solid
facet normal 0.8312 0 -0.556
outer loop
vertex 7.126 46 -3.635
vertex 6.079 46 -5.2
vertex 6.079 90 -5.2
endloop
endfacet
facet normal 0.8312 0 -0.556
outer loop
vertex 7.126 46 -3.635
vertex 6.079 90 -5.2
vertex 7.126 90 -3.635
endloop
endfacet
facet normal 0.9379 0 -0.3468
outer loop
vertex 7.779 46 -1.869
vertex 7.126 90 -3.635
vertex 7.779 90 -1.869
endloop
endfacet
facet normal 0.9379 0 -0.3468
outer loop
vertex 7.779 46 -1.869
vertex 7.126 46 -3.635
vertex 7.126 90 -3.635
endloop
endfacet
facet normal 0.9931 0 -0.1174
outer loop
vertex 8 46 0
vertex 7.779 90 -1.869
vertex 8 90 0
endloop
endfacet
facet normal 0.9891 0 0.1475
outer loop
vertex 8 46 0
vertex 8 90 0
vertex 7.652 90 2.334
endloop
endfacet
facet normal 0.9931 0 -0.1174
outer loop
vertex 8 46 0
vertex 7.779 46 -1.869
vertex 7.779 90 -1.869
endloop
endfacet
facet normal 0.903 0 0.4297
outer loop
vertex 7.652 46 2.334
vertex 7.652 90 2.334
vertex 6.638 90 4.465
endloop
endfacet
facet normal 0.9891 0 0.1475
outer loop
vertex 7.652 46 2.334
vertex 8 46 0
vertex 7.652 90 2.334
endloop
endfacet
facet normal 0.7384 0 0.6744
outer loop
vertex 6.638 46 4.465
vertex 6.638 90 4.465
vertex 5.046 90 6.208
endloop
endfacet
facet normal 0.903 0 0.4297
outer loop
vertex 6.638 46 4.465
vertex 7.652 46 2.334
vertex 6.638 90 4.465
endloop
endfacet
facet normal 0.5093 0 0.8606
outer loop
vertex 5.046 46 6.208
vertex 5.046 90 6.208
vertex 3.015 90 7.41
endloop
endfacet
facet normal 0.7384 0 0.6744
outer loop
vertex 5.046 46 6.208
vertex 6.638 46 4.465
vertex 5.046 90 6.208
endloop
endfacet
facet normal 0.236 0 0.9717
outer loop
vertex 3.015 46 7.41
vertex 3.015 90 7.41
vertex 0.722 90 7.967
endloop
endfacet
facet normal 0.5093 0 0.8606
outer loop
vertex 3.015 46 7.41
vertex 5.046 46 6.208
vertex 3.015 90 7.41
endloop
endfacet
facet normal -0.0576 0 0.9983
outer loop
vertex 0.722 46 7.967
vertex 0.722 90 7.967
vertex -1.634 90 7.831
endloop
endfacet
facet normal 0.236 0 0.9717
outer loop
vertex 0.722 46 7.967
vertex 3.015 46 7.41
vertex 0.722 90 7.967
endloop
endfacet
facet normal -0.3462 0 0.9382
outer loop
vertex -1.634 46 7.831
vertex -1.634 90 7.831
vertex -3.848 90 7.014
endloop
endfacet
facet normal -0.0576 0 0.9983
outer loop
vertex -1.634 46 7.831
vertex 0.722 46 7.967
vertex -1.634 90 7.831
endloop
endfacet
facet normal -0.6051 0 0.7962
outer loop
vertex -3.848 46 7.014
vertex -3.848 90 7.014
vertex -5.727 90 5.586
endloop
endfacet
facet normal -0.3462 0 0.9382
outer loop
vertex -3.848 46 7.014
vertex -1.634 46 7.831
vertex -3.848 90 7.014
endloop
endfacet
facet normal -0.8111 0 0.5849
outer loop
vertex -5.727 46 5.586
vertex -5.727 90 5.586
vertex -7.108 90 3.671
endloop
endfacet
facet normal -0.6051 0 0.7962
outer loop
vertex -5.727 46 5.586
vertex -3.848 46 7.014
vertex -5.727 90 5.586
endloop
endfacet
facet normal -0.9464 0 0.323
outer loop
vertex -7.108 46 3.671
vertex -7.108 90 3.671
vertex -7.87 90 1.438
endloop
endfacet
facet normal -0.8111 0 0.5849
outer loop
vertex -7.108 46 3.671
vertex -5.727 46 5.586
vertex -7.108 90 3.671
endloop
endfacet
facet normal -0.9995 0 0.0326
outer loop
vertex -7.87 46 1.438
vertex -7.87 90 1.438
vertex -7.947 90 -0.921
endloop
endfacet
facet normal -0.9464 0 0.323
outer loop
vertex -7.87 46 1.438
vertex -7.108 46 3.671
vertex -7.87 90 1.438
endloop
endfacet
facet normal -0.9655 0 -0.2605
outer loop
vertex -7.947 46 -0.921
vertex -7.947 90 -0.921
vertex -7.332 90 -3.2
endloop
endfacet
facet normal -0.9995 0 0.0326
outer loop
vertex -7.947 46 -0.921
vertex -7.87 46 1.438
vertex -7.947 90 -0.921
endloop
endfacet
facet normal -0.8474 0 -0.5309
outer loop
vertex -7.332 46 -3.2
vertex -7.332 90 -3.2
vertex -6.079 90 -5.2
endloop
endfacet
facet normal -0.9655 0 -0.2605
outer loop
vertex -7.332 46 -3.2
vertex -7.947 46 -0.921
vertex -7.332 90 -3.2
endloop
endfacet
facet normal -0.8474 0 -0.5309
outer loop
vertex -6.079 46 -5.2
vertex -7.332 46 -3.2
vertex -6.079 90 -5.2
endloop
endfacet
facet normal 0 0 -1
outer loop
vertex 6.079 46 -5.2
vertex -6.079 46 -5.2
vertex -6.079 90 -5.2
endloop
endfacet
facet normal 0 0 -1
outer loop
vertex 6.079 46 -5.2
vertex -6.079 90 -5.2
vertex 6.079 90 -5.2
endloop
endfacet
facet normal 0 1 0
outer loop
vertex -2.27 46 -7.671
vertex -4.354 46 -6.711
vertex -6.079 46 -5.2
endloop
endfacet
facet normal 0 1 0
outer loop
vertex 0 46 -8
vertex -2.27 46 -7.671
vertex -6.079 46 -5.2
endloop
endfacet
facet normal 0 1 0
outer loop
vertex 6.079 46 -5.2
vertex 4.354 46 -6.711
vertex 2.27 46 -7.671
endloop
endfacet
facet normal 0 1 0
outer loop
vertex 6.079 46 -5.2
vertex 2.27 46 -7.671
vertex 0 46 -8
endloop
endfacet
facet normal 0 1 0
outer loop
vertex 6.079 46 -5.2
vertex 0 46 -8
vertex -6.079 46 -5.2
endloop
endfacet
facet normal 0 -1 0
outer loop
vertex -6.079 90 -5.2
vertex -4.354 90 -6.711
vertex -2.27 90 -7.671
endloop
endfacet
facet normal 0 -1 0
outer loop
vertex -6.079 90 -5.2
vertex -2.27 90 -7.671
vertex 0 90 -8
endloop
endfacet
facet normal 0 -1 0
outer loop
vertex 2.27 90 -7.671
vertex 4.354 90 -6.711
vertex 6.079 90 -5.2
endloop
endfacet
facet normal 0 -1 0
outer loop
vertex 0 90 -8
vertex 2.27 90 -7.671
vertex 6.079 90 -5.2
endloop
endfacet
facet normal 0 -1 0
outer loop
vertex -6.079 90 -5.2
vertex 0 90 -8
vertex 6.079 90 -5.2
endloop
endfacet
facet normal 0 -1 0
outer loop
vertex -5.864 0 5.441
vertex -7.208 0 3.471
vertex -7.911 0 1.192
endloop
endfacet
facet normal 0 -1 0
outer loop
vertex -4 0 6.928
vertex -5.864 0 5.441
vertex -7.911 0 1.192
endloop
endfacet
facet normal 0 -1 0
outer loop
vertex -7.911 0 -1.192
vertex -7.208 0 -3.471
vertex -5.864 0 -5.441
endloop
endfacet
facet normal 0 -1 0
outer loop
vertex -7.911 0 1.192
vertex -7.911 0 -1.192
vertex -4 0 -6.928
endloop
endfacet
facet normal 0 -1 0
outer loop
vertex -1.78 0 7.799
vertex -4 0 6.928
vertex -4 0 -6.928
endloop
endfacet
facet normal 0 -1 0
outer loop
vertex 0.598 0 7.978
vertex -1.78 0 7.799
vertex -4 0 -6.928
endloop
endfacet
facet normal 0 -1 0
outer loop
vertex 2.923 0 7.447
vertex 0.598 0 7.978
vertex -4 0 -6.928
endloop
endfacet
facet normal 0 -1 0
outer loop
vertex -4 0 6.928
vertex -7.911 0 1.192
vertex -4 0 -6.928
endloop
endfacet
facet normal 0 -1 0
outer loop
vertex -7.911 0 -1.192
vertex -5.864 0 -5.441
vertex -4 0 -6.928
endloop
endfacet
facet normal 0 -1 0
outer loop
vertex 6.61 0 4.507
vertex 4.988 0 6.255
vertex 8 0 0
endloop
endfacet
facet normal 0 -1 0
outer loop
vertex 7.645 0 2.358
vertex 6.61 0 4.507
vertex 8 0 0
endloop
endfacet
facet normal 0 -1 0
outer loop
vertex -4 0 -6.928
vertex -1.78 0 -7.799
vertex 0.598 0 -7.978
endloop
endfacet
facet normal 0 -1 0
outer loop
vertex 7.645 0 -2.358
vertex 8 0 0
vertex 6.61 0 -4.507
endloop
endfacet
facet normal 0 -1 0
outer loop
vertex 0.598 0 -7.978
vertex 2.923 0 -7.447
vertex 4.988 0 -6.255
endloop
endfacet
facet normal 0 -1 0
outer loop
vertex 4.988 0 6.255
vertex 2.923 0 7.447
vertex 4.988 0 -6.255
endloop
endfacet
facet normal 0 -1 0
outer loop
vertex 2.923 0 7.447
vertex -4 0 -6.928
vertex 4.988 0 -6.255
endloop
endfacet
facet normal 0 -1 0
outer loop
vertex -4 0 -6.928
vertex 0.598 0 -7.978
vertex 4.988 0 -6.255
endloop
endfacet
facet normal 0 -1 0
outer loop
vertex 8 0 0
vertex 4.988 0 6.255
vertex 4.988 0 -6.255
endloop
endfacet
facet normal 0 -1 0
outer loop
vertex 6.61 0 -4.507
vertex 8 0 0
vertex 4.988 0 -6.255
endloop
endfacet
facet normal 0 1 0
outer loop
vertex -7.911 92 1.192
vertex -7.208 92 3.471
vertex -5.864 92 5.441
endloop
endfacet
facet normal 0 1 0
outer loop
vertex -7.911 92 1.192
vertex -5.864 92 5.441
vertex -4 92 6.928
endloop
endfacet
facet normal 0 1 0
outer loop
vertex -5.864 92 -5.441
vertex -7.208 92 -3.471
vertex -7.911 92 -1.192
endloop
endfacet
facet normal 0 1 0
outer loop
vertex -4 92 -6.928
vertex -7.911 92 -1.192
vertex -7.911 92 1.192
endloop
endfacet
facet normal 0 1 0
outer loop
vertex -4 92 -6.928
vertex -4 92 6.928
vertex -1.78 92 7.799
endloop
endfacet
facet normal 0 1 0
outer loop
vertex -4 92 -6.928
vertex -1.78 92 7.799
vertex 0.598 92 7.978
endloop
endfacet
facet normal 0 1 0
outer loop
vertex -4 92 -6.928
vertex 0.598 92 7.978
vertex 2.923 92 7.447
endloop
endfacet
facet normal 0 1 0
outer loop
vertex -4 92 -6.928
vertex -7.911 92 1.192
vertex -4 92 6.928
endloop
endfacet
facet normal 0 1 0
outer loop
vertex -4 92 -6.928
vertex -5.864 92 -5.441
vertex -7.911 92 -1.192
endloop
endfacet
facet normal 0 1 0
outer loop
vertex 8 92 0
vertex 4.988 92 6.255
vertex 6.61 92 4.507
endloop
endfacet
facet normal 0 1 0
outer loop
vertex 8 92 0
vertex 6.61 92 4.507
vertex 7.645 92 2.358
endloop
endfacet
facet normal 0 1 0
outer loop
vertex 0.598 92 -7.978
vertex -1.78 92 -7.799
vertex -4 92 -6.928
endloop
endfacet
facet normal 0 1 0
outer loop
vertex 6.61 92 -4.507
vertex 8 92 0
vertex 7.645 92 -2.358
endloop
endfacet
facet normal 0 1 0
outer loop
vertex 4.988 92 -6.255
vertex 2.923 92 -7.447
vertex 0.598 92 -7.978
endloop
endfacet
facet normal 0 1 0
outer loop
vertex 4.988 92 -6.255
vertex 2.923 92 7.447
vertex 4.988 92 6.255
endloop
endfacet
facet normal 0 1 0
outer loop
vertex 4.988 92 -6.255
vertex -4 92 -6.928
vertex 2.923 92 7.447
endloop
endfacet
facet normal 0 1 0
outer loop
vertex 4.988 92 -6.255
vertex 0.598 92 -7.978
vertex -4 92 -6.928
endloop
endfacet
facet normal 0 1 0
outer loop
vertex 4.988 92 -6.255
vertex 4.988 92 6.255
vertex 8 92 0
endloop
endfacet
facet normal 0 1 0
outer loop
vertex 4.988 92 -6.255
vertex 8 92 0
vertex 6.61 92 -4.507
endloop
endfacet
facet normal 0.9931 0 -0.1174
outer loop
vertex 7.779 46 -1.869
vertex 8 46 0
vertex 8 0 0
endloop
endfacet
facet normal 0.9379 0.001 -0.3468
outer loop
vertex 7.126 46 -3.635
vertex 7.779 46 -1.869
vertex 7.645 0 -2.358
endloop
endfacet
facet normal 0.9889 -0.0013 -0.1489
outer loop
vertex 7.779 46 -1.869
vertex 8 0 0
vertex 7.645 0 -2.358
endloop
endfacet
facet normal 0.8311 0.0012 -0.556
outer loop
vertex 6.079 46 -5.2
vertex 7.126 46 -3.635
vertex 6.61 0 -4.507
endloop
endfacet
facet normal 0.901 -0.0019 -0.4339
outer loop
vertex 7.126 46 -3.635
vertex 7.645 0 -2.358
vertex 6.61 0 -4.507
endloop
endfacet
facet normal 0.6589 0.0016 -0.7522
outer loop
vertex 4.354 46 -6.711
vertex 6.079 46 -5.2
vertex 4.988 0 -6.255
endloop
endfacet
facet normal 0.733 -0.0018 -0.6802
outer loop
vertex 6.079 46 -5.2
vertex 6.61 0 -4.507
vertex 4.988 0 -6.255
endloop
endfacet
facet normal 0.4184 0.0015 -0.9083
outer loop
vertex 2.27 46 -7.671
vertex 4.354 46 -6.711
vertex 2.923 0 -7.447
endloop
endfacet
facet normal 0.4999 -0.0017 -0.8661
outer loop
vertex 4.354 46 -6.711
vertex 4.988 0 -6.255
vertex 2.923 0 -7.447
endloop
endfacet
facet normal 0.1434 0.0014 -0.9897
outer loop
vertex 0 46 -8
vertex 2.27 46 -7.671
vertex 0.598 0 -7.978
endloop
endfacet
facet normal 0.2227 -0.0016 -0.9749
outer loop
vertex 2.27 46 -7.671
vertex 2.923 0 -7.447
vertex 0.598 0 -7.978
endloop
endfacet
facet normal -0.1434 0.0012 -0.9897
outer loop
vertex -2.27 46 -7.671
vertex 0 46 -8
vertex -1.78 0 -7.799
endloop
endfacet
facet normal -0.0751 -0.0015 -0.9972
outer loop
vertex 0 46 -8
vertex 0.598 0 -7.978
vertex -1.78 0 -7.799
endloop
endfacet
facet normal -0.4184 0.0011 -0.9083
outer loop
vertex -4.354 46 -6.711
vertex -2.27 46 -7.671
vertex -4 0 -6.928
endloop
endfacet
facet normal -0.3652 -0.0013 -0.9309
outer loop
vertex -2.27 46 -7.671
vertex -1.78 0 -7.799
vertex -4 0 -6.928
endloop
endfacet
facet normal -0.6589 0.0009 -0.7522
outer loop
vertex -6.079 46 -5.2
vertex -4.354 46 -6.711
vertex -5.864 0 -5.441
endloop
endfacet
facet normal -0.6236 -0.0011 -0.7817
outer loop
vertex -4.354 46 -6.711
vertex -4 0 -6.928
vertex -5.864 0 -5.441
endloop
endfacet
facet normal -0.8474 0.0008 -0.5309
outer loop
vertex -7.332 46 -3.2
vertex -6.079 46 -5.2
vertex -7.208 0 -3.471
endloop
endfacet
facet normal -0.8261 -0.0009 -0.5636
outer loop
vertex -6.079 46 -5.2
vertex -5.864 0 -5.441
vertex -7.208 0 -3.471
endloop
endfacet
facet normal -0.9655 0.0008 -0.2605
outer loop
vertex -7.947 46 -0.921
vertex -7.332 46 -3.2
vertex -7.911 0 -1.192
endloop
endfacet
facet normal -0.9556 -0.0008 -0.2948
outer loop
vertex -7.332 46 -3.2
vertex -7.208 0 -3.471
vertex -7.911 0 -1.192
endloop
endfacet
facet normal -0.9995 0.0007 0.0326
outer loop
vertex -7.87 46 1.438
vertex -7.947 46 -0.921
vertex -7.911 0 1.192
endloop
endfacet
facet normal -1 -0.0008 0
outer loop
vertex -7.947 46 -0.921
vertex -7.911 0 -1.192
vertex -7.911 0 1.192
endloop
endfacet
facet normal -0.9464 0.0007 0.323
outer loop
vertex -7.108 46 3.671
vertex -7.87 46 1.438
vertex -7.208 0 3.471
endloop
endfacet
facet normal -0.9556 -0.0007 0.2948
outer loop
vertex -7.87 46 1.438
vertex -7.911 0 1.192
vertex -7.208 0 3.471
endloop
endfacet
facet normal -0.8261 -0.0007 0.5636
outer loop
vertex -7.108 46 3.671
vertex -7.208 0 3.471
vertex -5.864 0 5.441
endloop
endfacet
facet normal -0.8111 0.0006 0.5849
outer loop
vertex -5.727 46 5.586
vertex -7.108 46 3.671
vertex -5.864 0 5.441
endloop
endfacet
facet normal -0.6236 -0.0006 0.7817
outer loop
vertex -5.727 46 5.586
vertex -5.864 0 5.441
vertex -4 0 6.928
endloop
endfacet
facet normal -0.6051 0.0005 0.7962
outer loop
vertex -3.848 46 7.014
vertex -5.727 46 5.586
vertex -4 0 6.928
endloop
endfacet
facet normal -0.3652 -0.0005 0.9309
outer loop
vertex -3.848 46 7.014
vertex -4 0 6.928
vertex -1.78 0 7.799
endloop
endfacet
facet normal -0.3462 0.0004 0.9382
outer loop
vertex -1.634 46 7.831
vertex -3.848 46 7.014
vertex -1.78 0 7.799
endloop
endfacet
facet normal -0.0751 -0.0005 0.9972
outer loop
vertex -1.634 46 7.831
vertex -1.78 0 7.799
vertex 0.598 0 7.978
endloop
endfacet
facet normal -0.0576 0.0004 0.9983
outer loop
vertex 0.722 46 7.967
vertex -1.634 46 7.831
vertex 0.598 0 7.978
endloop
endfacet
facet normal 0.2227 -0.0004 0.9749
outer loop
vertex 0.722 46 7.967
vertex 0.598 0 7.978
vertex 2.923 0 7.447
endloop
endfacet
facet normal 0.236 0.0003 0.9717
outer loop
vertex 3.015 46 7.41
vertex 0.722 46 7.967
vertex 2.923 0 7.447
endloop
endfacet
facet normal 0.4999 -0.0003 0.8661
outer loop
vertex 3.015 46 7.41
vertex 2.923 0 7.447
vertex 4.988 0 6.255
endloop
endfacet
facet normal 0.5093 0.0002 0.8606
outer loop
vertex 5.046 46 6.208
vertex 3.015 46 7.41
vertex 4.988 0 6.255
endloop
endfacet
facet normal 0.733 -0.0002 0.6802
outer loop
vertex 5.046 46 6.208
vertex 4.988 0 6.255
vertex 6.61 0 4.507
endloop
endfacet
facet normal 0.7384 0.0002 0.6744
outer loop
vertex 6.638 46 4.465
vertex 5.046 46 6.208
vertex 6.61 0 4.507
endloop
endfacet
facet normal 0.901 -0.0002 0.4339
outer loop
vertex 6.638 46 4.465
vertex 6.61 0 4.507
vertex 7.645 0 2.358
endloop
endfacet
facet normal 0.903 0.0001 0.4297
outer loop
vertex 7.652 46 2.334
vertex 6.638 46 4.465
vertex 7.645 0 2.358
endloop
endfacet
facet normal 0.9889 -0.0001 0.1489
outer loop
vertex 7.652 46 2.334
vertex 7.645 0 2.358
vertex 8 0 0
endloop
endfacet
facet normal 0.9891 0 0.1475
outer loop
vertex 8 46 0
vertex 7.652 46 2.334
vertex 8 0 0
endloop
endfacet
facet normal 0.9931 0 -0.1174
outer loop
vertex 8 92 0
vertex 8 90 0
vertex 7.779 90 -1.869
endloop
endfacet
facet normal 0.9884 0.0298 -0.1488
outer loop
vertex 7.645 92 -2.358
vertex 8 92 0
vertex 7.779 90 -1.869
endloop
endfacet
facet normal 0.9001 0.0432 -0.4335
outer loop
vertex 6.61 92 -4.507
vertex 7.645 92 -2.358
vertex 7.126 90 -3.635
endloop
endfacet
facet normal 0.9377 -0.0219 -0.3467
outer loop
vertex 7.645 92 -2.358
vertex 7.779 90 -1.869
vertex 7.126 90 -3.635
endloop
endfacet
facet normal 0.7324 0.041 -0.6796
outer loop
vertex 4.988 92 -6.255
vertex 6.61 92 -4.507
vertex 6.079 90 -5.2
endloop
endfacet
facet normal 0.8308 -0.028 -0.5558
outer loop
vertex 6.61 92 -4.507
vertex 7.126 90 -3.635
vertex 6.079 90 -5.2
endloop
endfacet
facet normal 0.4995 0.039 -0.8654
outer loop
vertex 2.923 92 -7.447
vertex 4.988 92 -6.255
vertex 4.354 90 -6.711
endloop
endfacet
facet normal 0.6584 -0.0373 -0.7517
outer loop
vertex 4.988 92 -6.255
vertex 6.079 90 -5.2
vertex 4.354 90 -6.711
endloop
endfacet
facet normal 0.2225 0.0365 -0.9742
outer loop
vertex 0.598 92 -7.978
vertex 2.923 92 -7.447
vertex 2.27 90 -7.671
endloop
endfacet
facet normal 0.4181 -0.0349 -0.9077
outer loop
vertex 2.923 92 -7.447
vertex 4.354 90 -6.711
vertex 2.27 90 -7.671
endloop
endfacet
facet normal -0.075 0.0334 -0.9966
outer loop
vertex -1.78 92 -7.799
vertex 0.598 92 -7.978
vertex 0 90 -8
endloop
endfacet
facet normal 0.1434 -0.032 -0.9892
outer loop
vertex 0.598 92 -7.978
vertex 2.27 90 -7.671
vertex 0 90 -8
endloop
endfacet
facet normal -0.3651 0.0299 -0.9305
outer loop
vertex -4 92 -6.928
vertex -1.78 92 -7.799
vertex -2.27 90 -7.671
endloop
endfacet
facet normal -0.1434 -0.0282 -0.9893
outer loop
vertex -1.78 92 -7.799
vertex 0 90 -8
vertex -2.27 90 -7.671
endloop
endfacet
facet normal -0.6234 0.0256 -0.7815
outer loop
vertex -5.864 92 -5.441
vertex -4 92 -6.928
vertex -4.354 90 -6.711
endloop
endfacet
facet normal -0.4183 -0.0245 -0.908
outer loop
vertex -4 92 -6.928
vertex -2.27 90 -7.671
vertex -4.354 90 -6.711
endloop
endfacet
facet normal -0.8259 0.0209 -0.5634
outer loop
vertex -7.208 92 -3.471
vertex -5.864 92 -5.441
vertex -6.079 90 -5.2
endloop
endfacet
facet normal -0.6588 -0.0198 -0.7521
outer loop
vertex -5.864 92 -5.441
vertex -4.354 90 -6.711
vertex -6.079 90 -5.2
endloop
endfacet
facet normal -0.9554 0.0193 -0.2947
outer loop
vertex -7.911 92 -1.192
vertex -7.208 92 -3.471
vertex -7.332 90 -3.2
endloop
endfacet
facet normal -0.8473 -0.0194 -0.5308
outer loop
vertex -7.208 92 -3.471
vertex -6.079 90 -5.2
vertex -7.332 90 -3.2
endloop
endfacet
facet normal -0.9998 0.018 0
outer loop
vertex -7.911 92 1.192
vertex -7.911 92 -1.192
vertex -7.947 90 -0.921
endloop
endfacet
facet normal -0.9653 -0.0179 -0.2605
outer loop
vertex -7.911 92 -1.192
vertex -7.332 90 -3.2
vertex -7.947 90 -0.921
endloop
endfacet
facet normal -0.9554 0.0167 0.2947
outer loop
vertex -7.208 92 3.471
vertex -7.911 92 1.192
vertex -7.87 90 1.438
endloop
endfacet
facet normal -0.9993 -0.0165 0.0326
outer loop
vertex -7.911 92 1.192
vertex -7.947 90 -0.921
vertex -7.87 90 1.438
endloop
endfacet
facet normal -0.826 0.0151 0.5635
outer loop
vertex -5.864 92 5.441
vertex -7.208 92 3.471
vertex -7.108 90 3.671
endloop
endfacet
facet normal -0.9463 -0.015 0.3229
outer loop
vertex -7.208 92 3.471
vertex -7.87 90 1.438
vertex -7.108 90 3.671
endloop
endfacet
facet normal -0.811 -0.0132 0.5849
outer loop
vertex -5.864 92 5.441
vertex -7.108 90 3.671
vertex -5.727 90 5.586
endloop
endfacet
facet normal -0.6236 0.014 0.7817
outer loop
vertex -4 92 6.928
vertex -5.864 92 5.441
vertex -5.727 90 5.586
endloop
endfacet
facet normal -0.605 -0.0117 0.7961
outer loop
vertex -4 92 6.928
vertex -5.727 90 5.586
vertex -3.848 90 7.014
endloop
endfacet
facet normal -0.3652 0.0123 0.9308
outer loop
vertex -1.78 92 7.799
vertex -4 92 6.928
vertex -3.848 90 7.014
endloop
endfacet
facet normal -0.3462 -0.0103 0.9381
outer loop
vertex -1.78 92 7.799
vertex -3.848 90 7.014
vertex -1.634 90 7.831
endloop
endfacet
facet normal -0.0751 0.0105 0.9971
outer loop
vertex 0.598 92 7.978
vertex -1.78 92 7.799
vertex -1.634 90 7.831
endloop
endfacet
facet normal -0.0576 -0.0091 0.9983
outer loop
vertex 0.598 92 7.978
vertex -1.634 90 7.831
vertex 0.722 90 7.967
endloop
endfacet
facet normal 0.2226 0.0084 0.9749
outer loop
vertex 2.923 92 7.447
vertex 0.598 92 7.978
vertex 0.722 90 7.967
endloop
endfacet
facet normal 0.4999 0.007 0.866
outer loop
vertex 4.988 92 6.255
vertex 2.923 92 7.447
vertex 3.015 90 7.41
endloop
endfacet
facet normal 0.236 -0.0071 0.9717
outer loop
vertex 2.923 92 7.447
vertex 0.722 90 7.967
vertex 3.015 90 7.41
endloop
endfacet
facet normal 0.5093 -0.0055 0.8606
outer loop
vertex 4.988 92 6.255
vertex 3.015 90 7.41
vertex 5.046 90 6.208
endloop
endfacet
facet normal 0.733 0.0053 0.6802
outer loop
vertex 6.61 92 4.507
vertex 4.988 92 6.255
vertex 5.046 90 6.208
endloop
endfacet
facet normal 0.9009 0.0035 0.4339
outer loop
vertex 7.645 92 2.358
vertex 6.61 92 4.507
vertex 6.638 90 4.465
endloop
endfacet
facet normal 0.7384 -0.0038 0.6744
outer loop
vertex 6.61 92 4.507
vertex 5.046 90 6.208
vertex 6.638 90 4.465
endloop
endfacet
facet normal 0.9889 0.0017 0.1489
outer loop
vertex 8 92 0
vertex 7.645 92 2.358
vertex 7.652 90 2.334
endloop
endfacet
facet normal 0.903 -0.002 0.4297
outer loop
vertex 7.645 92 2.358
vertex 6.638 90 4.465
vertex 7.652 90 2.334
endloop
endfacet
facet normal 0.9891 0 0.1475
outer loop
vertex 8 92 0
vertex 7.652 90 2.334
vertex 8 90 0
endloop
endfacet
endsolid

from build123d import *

# Parameters (mm, degrees)
SKETCH1_R           = 8
BOSS_EXTRUDE1_DEPTH = 46
BOSS_EXTRUDE2_DEPTH = 44
SKETCH3_R           = 8
BOSS_EXTRUDE3_DEPTH = 2


with BuildPart() as part:
    # Sketch1 → Boss-Extrude1 (new body)
    with BuildSketch(Plane(origin=(0, 0, 0), x_dir=(1, 0, 0), z_dir=(0, 1, 0))):
        Circle(SKETCH1_R)
    extrude(amount=BOSS_EXTRUDE1_DEPTH)

    # Sketch2 → Boss-Extrude2 (add)
    with BuildSketch(Plane(origin=(0, 46, 0), x_dir=(1, 0, 0), z_dir=(0, 1, 0))):
        with BuildLine():
            Line((-6.079473661, 5.2), (6.079473661, 5.2))
            ThreePointArc((6.079473661, 5.2), (0, -8), (-6.079473661, 5.2))
        make_face()
    extrude(amount=BOSS_EXTRUDE2_DEPTH)

    # Sketch3 → Boss-Extrude3 (add)
    with BuildSketch(Plane(origin=(0, 90, 0), x_dir=(1, 0, 0), z_dir=(0, 1, 0))):
        Circle(SKETCH3_R)
    extrude(amount=BOSS_EXTRUDE3_DEPTH)


solid = part.part
